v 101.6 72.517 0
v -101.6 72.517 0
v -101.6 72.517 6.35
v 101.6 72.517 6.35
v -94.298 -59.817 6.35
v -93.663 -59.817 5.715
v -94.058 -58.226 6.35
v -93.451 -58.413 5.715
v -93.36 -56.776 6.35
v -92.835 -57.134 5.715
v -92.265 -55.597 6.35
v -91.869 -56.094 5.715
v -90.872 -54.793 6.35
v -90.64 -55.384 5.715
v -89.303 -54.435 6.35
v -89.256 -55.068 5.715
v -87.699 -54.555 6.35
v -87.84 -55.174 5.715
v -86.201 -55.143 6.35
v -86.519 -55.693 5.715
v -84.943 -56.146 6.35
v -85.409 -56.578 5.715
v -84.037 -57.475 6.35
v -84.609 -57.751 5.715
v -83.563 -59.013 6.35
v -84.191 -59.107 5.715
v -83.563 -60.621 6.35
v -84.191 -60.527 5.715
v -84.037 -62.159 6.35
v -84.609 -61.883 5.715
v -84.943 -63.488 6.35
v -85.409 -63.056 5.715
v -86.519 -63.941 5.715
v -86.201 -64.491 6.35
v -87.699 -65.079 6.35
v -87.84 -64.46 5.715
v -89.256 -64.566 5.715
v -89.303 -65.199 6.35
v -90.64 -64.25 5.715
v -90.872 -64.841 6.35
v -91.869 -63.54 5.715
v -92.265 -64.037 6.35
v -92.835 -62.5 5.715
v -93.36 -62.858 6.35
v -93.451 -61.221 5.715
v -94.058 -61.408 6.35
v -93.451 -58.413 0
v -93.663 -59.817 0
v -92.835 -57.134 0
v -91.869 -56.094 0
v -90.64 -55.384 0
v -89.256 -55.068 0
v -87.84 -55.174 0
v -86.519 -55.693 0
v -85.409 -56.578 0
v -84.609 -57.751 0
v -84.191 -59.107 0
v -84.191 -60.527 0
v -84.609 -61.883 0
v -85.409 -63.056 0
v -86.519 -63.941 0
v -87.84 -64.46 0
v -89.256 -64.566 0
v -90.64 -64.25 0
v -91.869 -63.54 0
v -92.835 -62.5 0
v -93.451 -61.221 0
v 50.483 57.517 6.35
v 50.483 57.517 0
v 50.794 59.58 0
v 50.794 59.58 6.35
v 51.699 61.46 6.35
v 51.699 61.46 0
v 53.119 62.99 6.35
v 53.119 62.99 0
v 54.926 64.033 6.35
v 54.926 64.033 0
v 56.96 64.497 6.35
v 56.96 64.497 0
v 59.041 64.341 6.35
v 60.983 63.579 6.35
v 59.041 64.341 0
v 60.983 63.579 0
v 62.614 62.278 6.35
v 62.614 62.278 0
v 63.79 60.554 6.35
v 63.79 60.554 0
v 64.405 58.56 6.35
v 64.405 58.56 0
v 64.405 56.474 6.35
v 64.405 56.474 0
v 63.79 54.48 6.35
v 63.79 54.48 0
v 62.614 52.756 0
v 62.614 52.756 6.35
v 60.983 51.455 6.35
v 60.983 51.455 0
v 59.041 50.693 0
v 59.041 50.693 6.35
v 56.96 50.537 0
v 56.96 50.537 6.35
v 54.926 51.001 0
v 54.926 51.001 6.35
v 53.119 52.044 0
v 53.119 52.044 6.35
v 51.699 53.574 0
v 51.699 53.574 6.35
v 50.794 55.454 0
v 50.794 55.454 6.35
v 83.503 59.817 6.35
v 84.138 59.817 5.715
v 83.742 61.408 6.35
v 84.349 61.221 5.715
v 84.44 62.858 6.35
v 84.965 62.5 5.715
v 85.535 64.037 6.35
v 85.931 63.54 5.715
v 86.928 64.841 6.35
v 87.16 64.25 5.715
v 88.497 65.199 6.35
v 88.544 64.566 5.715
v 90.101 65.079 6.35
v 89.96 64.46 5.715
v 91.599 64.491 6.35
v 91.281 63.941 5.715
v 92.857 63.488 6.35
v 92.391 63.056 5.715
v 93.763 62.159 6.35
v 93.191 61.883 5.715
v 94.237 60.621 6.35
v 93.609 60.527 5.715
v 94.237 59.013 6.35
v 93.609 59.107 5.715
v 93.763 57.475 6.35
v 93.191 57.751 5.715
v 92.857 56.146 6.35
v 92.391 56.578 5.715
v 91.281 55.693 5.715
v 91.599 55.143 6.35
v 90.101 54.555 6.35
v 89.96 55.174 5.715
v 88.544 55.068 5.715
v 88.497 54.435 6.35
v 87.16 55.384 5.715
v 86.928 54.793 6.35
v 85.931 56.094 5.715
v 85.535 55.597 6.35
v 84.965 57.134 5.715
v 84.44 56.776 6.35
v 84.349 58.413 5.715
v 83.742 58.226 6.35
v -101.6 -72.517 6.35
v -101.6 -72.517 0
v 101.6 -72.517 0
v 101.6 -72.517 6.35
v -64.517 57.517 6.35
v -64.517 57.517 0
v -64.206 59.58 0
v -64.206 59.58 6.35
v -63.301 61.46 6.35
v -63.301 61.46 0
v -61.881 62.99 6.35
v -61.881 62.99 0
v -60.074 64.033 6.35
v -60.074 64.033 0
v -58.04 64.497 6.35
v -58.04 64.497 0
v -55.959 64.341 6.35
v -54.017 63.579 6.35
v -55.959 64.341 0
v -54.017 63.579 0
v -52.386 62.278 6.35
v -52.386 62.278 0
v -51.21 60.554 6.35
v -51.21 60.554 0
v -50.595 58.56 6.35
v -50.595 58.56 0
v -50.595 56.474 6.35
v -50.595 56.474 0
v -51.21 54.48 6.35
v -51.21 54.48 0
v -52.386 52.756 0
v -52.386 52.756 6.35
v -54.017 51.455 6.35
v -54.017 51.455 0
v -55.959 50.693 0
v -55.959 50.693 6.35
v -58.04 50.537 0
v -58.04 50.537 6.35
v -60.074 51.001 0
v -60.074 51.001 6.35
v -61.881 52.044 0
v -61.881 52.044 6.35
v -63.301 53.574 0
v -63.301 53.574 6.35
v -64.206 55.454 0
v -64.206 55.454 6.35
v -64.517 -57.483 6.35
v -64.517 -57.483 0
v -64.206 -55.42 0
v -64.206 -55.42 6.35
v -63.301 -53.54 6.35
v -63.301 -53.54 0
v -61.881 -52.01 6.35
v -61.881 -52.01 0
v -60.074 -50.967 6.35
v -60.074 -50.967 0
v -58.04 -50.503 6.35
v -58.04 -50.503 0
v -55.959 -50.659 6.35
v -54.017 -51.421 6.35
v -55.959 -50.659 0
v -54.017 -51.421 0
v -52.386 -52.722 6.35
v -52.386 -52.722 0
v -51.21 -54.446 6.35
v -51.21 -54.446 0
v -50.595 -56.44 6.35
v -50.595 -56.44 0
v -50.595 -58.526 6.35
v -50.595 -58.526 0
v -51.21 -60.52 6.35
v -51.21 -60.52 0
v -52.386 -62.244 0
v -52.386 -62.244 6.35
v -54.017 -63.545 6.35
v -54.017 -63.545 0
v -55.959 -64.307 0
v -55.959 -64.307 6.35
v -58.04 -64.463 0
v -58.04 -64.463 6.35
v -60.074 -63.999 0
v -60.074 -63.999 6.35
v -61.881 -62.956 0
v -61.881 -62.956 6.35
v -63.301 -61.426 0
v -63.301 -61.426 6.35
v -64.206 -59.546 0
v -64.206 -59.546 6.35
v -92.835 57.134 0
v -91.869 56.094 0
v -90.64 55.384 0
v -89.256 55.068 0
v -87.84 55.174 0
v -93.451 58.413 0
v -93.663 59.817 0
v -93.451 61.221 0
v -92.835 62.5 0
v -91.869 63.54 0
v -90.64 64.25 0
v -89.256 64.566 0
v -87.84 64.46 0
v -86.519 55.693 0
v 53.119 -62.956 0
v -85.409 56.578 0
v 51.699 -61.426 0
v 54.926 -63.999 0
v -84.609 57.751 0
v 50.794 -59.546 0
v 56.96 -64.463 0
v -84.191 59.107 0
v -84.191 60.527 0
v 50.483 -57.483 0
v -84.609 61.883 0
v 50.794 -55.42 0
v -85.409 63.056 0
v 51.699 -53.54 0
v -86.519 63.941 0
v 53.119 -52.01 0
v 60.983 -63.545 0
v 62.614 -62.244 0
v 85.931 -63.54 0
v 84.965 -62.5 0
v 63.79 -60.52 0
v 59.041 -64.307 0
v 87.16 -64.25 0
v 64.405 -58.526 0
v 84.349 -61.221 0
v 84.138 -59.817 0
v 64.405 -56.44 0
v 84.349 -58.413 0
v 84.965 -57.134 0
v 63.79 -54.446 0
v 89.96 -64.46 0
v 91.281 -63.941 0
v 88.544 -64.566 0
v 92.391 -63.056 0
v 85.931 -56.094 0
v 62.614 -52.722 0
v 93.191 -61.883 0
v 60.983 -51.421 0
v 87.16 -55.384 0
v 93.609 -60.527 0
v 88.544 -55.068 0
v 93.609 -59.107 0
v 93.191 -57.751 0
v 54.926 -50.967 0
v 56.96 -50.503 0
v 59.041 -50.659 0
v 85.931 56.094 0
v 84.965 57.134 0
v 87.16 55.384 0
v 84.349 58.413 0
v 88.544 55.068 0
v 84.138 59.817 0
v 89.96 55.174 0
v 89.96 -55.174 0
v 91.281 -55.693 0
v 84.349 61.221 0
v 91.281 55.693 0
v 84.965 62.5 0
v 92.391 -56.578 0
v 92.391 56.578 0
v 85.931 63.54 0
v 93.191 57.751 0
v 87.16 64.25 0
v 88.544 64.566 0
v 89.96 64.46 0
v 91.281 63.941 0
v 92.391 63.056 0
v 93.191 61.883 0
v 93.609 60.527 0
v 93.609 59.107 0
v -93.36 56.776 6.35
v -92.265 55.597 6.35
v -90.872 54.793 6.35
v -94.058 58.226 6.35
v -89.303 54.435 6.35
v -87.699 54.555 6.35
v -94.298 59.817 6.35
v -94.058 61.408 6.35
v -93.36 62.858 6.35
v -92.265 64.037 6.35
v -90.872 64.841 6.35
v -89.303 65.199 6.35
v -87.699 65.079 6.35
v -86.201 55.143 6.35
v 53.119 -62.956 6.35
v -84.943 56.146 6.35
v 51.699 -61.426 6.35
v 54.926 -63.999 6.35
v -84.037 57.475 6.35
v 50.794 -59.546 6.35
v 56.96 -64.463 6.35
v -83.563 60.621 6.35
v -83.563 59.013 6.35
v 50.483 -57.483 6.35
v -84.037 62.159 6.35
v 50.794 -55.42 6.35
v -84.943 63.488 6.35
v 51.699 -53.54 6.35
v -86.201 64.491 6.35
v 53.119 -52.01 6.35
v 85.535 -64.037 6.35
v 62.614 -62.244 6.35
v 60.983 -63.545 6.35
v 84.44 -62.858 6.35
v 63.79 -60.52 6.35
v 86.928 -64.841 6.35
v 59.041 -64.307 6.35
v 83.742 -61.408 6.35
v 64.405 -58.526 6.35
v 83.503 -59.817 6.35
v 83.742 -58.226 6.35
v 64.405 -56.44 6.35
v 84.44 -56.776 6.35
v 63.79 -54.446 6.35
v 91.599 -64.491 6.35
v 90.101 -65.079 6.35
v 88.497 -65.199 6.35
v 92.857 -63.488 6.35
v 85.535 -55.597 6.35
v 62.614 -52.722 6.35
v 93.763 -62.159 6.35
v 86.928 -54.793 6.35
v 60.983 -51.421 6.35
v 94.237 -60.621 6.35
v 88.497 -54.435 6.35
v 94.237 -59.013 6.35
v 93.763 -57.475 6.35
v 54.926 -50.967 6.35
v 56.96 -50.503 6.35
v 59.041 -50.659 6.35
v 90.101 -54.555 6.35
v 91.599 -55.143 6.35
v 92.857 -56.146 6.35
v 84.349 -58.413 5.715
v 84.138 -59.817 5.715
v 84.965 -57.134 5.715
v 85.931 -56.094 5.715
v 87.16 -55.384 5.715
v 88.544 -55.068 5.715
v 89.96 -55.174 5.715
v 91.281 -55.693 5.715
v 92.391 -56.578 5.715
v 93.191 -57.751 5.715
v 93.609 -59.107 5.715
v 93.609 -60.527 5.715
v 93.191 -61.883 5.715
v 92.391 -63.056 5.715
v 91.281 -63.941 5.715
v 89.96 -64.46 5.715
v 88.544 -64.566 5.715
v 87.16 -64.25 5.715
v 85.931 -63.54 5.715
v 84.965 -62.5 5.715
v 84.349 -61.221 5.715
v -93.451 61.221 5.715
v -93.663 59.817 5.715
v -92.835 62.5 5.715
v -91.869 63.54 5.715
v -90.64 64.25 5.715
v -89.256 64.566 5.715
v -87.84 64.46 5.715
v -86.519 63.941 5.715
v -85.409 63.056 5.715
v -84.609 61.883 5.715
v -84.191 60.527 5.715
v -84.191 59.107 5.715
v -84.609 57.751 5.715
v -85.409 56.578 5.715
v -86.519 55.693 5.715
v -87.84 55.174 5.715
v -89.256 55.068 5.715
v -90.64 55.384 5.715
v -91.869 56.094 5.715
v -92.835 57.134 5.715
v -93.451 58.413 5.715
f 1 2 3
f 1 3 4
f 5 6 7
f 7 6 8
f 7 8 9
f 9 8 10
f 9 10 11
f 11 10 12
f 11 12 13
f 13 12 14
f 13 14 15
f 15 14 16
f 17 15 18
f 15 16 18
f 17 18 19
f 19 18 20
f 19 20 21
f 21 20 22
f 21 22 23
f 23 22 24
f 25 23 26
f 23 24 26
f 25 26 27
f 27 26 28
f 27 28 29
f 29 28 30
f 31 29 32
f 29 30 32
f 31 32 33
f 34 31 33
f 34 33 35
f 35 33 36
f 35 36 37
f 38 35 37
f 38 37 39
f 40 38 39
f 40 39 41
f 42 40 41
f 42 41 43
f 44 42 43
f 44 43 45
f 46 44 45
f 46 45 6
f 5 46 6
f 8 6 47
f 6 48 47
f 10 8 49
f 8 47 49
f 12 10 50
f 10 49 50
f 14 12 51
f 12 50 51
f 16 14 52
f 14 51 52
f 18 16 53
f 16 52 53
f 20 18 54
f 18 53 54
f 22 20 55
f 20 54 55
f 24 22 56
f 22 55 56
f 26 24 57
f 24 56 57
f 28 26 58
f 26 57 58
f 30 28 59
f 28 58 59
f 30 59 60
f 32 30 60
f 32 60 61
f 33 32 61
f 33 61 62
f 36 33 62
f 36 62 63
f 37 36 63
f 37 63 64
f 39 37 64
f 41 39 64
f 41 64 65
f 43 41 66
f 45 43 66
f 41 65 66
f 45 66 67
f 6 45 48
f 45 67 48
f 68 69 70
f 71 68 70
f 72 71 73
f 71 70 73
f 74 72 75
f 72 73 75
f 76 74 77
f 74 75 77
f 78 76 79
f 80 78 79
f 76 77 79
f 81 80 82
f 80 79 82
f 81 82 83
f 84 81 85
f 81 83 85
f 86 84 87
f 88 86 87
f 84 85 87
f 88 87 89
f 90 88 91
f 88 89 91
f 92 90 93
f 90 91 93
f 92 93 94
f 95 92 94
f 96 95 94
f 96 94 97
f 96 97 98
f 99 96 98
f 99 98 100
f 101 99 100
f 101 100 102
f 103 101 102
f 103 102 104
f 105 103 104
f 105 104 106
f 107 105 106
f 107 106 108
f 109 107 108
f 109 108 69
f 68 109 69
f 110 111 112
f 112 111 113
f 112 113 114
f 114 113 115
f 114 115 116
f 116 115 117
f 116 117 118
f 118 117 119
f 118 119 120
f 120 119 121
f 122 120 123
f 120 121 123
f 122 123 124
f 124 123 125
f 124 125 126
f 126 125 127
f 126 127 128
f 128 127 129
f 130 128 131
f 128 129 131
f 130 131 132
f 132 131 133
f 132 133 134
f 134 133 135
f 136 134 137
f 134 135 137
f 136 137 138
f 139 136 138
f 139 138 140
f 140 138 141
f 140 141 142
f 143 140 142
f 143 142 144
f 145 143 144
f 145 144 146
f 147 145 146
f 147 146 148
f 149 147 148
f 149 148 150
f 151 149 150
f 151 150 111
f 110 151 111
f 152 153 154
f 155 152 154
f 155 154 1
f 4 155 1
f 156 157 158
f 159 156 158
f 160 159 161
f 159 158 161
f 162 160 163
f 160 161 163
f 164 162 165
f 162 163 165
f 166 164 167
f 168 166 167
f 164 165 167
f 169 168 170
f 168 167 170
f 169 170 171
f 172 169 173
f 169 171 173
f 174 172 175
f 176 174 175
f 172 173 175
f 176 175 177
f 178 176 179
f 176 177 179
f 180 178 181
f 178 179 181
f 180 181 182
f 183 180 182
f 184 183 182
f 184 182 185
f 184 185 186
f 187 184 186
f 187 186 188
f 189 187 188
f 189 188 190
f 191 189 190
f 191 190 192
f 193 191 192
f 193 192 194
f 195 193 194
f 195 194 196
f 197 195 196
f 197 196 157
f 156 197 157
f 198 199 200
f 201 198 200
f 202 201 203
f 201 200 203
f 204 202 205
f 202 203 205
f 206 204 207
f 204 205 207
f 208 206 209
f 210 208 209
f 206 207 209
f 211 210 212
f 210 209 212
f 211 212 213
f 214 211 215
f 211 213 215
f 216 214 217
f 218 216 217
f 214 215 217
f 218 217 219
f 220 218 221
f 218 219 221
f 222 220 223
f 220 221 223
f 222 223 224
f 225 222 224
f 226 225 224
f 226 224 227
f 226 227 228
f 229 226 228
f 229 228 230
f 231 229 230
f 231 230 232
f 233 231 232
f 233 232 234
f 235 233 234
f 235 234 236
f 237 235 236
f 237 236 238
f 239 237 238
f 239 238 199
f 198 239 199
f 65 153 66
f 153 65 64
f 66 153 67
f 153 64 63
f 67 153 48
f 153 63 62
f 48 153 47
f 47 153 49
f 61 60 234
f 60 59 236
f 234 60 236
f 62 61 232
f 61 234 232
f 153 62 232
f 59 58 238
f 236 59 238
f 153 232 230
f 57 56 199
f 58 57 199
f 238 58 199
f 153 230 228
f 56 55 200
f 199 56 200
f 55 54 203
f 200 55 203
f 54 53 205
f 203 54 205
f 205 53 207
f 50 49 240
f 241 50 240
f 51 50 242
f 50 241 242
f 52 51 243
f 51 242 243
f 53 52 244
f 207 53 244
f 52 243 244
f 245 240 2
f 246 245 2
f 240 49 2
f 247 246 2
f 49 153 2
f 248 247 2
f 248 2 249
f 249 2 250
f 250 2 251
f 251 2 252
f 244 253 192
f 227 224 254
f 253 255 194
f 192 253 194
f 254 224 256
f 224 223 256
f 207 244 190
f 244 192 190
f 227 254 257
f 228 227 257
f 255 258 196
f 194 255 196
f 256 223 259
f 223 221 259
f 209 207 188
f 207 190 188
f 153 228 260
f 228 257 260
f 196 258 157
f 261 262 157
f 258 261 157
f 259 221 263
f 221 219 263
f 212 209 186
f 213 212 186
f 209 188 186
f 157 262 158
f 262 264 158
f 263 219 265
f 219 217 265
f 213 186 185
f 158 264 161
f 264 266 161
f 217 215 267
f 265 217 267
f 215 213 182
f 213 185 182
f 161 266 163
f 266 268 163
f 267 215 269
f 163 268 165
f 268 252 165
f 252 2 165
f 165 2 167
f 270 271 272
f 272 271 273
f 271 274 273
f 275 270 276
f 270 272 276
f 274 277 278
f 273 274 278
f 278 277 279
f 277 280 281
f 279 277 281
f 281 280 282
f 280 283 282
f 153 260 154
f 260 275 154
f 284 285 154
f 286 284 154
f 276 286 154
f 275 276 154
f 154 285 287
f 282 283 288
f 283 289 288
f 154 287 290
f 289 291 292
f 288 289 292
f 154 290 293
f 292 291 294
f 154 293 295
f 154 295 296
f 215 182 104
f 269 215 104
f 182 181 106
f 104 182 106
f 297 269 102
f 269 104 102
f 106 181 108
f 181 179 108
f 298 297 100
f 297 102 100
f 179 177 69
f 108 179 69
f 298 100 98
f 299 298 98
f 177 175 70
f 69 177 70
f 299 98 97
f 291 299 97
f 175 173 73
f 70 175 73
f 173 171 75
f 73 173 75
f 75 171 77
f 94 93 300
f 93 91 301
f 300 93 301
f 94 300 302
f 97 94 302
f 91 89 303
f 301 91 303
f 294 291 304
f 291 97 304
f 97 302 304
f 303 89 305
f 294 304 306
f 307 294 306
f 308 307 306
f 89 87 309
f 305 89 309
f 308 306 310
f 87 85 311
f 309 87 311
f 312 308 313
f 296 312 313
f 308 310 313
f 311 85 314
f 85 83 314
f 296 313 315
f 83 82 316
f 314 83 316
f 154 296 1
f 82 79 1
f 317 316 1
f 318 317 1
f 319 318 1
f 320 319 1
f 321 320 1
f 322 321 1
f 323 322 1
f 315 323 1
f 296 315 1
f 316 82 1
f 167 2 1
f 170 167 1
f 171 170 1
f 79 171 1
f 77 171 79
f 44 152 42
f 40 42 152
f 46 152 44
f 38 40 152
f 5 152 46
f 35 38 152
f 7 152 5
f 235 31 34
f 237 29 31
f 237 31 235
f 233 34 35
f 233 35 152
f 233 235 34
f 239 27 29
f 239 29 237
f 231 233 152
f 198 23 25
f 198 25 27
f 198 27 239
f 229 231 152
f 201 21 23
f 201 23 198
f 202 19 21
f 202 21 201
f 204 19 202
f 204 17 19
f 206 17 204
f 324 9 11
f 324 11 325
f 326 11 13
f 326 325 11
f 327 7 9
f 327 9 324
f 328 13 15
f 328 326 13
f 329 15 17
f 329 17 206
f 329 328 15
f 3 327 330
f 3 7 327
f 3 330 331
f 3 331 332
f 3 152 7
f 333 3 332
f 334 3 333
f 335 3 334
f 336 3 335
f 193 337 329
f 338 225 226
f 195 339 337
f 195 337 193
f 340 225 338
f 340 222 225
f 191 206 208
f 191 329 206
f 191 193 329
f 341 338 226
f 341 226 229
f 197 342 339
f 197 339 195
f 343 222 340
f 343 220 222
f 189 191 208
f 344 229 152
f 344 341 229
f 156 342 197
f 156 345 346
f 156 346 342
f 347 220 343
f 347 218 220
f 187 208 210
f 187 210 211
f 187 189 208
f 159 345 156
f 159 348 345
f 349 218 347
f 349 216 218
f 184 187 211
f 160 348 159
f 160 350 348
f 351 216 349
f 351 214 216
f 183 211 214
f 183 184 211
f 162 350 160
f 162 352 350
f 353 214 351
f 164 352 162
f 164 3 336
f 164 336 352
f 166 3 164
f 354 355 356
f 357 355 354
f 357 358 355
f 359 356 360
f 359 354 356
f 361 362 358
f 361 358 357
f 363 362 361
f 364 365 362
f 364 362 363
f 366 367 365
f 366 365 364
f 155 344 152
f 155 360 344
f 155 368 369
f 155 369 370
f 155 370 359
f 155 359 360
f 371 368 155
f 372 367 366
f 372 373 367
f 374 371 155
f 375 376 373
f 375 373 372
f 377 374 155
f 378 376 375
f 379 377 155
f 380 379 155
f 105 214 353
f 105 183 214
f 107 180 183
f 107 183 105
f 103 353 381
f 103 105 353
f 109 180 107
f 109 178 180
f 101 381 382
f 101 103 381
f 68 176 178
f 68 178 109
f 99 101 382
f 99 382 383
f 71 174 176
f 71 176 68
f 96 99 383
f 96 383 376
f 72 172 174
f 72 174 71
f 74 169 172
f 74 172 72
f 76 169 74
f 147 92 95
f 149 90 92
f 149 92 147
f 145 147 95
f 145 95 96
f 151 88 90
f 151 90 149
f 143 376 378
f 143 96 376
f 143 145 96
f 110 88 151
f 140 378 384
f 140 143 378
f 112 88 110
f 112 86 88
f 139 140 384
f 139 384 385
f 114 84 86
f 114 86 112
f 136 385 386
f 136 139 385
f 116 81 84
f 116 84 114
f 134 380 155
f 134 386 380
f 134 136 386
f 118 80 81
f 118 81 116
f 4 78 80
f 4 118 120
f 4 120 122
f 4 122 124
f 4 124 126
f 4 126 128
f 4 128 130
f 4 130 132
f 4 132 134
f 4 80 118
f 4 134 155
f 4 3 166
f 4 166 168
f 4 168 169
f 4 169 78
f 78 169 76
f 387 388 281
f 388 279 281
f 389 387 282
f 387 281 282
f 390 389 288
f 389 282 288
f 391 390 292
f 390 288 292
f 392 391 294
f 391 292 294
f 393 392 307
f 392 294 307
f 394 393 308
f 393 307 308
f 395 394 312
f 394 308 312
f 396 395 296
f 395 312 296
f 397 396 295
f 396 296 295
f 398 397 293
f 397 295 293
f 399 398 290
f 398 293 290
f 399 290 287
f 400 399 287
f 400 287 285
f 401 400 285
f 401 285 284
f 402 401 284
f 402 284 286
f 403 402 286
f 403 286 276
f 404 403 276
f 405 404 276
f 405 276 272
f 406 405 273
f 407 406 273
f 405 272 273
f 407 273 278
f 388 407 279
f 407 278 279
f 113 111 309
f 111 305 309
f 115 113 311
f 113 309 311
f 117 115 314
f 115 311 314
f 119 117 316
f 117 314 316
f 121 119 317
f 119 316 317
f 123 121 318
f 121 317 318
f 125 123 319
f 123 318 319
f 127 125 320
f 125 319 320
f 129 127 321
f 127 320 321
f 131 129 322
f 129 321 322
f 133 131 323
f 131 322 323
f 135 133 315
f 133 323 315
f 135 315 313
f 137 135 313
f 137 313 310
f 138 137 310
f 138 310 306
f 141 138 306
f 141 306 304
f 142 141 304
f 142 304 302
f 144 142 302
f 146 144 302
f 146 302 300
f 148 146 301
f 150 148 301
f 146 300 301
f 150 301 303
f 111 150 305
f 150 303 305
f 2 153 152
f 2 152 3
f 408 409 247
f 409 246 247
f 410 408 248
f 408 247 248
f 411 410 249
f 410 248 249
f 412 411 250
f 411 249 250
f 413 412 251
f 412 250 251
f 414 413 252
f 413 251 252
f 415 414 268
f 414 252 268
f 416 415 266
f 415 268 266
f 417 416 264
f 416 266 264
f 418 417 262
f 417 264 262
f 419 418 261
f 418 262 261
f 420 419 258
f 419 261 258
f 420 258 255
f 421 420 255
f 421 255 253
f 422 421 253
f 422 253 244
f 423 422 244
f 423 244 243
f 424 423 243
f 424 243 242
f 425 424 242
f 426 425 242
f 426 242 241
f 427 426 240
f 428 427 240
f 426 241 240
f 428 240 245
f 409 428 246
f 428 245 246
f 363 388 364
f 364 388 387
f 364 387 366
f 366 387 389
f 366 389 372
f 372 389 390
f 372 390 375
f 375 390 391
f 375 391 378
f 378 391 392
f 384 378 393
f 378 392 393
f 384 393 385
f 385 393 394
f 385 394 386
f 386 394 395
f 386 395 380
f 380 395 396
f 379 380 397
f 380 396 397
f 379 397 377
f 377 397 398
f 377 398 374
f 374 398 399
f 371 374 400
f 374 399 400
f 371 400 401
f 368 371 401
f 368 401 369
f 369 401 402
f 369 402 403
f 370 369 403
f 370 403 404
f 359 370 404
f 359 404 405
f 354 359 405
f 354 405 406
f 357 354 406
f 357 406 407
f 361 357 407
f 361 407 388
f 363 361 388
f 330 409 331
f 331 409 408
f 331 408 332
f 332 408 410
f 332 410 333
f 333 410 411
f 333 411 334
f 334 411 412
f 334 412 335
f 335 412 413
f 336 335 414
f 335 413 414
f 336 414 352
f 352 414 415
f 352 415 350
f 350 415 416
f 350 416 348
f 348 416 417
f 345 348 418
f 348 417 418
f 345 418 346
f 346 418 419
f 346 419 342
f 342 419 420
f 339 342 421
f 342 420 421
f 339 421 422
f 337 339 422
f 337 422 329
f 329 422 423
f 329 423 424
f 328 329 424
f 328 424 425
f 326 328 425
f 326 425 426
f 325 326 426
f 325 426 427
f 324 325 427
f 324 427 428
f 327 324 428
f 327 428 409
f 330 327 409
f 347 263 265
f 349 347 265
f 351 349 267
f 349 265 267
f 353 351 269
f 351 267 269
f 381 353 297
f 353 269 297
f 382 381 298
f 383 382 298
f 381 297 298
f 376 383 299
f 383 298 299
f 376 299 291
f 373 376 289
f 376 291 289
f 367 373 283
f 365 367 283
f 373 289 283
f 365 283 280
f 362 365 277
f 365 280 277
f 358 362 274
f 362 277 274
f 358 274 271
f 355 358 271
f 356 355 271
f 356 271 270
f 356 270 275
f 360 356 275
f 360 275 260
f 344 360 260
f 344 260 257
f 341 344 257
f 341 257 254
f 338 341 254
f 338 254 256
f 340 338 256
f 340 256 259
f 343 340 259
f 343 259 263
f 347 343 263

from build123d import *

# Parameters (mm, degrees)
SKETCH1_W                              = 203.2
SKETCH1_H                              = 145.034
BOSS_EXTRUDE1_DEPTH                    = 6.35
F_3_8_0_375_DIAMETER_HOLE1_D           = 9.525
F_3_8_0_375_DIAMETER_HOLE1_CSINK_D     = 10.795
F_3_8_0_375_DIAMETER_HOLE1_CSINK_ANGLE = 90
SKETCH4_R                              = 7
CUT_EXTRUDE1_DEPTH                     = 125.986390415


with BuildPart() as part:
    # Sketch1 → Boss-Extrude1 (new body)
    with BuildSketch(Plane.XY):
        Rectangle(SKETCH1_W, SKETCH1_H)
    extrude(amount=BOSS_EXTRUDE1_DEPTH)

    # 3/8 (0.375) Diameter Hole1 (through all)
    with Locations(Plane.XY.offset(6.35)):
        with Locations((-88.9, 59.817), (-88.9, -59.817), (88.9, -59.817), (88.9, 59.817)):
            CounterSinkHole(F_3_8_0_375_DIAMETER_HOLE1_D / 2, F_3_8_0_375_DIAMETER_HOLE1_CSINK_D / 2, counter_sink_angle=F_3_8_0_375_DIAMETER_HOLE1_CSINK_ANGLE)

    # Sketch4 → Cut-Extrude1 (cut, through all)
    with BuildSketch(Plane(origin=(0, 0, 0), x_dir=(-1, 0, 0), z_dir=(0, 0, -1))):
        with Locations((-57.483, 57.517)):
            Circle(SKETCH4_R)
        with Locations((57.517, 57.517)):
            Circle(SKETCH4_R)
        with Locations((57.517, -57.483)):
            Circle(SKETCH4_R)
        with Locations((-57.483, -57.483)):
            Circle(SKETCH4_R)
    extrude(amount=-CUT_EXTRUDE1_DEPTH, mode=Mode.SUBTRACT)


solid = part.part
